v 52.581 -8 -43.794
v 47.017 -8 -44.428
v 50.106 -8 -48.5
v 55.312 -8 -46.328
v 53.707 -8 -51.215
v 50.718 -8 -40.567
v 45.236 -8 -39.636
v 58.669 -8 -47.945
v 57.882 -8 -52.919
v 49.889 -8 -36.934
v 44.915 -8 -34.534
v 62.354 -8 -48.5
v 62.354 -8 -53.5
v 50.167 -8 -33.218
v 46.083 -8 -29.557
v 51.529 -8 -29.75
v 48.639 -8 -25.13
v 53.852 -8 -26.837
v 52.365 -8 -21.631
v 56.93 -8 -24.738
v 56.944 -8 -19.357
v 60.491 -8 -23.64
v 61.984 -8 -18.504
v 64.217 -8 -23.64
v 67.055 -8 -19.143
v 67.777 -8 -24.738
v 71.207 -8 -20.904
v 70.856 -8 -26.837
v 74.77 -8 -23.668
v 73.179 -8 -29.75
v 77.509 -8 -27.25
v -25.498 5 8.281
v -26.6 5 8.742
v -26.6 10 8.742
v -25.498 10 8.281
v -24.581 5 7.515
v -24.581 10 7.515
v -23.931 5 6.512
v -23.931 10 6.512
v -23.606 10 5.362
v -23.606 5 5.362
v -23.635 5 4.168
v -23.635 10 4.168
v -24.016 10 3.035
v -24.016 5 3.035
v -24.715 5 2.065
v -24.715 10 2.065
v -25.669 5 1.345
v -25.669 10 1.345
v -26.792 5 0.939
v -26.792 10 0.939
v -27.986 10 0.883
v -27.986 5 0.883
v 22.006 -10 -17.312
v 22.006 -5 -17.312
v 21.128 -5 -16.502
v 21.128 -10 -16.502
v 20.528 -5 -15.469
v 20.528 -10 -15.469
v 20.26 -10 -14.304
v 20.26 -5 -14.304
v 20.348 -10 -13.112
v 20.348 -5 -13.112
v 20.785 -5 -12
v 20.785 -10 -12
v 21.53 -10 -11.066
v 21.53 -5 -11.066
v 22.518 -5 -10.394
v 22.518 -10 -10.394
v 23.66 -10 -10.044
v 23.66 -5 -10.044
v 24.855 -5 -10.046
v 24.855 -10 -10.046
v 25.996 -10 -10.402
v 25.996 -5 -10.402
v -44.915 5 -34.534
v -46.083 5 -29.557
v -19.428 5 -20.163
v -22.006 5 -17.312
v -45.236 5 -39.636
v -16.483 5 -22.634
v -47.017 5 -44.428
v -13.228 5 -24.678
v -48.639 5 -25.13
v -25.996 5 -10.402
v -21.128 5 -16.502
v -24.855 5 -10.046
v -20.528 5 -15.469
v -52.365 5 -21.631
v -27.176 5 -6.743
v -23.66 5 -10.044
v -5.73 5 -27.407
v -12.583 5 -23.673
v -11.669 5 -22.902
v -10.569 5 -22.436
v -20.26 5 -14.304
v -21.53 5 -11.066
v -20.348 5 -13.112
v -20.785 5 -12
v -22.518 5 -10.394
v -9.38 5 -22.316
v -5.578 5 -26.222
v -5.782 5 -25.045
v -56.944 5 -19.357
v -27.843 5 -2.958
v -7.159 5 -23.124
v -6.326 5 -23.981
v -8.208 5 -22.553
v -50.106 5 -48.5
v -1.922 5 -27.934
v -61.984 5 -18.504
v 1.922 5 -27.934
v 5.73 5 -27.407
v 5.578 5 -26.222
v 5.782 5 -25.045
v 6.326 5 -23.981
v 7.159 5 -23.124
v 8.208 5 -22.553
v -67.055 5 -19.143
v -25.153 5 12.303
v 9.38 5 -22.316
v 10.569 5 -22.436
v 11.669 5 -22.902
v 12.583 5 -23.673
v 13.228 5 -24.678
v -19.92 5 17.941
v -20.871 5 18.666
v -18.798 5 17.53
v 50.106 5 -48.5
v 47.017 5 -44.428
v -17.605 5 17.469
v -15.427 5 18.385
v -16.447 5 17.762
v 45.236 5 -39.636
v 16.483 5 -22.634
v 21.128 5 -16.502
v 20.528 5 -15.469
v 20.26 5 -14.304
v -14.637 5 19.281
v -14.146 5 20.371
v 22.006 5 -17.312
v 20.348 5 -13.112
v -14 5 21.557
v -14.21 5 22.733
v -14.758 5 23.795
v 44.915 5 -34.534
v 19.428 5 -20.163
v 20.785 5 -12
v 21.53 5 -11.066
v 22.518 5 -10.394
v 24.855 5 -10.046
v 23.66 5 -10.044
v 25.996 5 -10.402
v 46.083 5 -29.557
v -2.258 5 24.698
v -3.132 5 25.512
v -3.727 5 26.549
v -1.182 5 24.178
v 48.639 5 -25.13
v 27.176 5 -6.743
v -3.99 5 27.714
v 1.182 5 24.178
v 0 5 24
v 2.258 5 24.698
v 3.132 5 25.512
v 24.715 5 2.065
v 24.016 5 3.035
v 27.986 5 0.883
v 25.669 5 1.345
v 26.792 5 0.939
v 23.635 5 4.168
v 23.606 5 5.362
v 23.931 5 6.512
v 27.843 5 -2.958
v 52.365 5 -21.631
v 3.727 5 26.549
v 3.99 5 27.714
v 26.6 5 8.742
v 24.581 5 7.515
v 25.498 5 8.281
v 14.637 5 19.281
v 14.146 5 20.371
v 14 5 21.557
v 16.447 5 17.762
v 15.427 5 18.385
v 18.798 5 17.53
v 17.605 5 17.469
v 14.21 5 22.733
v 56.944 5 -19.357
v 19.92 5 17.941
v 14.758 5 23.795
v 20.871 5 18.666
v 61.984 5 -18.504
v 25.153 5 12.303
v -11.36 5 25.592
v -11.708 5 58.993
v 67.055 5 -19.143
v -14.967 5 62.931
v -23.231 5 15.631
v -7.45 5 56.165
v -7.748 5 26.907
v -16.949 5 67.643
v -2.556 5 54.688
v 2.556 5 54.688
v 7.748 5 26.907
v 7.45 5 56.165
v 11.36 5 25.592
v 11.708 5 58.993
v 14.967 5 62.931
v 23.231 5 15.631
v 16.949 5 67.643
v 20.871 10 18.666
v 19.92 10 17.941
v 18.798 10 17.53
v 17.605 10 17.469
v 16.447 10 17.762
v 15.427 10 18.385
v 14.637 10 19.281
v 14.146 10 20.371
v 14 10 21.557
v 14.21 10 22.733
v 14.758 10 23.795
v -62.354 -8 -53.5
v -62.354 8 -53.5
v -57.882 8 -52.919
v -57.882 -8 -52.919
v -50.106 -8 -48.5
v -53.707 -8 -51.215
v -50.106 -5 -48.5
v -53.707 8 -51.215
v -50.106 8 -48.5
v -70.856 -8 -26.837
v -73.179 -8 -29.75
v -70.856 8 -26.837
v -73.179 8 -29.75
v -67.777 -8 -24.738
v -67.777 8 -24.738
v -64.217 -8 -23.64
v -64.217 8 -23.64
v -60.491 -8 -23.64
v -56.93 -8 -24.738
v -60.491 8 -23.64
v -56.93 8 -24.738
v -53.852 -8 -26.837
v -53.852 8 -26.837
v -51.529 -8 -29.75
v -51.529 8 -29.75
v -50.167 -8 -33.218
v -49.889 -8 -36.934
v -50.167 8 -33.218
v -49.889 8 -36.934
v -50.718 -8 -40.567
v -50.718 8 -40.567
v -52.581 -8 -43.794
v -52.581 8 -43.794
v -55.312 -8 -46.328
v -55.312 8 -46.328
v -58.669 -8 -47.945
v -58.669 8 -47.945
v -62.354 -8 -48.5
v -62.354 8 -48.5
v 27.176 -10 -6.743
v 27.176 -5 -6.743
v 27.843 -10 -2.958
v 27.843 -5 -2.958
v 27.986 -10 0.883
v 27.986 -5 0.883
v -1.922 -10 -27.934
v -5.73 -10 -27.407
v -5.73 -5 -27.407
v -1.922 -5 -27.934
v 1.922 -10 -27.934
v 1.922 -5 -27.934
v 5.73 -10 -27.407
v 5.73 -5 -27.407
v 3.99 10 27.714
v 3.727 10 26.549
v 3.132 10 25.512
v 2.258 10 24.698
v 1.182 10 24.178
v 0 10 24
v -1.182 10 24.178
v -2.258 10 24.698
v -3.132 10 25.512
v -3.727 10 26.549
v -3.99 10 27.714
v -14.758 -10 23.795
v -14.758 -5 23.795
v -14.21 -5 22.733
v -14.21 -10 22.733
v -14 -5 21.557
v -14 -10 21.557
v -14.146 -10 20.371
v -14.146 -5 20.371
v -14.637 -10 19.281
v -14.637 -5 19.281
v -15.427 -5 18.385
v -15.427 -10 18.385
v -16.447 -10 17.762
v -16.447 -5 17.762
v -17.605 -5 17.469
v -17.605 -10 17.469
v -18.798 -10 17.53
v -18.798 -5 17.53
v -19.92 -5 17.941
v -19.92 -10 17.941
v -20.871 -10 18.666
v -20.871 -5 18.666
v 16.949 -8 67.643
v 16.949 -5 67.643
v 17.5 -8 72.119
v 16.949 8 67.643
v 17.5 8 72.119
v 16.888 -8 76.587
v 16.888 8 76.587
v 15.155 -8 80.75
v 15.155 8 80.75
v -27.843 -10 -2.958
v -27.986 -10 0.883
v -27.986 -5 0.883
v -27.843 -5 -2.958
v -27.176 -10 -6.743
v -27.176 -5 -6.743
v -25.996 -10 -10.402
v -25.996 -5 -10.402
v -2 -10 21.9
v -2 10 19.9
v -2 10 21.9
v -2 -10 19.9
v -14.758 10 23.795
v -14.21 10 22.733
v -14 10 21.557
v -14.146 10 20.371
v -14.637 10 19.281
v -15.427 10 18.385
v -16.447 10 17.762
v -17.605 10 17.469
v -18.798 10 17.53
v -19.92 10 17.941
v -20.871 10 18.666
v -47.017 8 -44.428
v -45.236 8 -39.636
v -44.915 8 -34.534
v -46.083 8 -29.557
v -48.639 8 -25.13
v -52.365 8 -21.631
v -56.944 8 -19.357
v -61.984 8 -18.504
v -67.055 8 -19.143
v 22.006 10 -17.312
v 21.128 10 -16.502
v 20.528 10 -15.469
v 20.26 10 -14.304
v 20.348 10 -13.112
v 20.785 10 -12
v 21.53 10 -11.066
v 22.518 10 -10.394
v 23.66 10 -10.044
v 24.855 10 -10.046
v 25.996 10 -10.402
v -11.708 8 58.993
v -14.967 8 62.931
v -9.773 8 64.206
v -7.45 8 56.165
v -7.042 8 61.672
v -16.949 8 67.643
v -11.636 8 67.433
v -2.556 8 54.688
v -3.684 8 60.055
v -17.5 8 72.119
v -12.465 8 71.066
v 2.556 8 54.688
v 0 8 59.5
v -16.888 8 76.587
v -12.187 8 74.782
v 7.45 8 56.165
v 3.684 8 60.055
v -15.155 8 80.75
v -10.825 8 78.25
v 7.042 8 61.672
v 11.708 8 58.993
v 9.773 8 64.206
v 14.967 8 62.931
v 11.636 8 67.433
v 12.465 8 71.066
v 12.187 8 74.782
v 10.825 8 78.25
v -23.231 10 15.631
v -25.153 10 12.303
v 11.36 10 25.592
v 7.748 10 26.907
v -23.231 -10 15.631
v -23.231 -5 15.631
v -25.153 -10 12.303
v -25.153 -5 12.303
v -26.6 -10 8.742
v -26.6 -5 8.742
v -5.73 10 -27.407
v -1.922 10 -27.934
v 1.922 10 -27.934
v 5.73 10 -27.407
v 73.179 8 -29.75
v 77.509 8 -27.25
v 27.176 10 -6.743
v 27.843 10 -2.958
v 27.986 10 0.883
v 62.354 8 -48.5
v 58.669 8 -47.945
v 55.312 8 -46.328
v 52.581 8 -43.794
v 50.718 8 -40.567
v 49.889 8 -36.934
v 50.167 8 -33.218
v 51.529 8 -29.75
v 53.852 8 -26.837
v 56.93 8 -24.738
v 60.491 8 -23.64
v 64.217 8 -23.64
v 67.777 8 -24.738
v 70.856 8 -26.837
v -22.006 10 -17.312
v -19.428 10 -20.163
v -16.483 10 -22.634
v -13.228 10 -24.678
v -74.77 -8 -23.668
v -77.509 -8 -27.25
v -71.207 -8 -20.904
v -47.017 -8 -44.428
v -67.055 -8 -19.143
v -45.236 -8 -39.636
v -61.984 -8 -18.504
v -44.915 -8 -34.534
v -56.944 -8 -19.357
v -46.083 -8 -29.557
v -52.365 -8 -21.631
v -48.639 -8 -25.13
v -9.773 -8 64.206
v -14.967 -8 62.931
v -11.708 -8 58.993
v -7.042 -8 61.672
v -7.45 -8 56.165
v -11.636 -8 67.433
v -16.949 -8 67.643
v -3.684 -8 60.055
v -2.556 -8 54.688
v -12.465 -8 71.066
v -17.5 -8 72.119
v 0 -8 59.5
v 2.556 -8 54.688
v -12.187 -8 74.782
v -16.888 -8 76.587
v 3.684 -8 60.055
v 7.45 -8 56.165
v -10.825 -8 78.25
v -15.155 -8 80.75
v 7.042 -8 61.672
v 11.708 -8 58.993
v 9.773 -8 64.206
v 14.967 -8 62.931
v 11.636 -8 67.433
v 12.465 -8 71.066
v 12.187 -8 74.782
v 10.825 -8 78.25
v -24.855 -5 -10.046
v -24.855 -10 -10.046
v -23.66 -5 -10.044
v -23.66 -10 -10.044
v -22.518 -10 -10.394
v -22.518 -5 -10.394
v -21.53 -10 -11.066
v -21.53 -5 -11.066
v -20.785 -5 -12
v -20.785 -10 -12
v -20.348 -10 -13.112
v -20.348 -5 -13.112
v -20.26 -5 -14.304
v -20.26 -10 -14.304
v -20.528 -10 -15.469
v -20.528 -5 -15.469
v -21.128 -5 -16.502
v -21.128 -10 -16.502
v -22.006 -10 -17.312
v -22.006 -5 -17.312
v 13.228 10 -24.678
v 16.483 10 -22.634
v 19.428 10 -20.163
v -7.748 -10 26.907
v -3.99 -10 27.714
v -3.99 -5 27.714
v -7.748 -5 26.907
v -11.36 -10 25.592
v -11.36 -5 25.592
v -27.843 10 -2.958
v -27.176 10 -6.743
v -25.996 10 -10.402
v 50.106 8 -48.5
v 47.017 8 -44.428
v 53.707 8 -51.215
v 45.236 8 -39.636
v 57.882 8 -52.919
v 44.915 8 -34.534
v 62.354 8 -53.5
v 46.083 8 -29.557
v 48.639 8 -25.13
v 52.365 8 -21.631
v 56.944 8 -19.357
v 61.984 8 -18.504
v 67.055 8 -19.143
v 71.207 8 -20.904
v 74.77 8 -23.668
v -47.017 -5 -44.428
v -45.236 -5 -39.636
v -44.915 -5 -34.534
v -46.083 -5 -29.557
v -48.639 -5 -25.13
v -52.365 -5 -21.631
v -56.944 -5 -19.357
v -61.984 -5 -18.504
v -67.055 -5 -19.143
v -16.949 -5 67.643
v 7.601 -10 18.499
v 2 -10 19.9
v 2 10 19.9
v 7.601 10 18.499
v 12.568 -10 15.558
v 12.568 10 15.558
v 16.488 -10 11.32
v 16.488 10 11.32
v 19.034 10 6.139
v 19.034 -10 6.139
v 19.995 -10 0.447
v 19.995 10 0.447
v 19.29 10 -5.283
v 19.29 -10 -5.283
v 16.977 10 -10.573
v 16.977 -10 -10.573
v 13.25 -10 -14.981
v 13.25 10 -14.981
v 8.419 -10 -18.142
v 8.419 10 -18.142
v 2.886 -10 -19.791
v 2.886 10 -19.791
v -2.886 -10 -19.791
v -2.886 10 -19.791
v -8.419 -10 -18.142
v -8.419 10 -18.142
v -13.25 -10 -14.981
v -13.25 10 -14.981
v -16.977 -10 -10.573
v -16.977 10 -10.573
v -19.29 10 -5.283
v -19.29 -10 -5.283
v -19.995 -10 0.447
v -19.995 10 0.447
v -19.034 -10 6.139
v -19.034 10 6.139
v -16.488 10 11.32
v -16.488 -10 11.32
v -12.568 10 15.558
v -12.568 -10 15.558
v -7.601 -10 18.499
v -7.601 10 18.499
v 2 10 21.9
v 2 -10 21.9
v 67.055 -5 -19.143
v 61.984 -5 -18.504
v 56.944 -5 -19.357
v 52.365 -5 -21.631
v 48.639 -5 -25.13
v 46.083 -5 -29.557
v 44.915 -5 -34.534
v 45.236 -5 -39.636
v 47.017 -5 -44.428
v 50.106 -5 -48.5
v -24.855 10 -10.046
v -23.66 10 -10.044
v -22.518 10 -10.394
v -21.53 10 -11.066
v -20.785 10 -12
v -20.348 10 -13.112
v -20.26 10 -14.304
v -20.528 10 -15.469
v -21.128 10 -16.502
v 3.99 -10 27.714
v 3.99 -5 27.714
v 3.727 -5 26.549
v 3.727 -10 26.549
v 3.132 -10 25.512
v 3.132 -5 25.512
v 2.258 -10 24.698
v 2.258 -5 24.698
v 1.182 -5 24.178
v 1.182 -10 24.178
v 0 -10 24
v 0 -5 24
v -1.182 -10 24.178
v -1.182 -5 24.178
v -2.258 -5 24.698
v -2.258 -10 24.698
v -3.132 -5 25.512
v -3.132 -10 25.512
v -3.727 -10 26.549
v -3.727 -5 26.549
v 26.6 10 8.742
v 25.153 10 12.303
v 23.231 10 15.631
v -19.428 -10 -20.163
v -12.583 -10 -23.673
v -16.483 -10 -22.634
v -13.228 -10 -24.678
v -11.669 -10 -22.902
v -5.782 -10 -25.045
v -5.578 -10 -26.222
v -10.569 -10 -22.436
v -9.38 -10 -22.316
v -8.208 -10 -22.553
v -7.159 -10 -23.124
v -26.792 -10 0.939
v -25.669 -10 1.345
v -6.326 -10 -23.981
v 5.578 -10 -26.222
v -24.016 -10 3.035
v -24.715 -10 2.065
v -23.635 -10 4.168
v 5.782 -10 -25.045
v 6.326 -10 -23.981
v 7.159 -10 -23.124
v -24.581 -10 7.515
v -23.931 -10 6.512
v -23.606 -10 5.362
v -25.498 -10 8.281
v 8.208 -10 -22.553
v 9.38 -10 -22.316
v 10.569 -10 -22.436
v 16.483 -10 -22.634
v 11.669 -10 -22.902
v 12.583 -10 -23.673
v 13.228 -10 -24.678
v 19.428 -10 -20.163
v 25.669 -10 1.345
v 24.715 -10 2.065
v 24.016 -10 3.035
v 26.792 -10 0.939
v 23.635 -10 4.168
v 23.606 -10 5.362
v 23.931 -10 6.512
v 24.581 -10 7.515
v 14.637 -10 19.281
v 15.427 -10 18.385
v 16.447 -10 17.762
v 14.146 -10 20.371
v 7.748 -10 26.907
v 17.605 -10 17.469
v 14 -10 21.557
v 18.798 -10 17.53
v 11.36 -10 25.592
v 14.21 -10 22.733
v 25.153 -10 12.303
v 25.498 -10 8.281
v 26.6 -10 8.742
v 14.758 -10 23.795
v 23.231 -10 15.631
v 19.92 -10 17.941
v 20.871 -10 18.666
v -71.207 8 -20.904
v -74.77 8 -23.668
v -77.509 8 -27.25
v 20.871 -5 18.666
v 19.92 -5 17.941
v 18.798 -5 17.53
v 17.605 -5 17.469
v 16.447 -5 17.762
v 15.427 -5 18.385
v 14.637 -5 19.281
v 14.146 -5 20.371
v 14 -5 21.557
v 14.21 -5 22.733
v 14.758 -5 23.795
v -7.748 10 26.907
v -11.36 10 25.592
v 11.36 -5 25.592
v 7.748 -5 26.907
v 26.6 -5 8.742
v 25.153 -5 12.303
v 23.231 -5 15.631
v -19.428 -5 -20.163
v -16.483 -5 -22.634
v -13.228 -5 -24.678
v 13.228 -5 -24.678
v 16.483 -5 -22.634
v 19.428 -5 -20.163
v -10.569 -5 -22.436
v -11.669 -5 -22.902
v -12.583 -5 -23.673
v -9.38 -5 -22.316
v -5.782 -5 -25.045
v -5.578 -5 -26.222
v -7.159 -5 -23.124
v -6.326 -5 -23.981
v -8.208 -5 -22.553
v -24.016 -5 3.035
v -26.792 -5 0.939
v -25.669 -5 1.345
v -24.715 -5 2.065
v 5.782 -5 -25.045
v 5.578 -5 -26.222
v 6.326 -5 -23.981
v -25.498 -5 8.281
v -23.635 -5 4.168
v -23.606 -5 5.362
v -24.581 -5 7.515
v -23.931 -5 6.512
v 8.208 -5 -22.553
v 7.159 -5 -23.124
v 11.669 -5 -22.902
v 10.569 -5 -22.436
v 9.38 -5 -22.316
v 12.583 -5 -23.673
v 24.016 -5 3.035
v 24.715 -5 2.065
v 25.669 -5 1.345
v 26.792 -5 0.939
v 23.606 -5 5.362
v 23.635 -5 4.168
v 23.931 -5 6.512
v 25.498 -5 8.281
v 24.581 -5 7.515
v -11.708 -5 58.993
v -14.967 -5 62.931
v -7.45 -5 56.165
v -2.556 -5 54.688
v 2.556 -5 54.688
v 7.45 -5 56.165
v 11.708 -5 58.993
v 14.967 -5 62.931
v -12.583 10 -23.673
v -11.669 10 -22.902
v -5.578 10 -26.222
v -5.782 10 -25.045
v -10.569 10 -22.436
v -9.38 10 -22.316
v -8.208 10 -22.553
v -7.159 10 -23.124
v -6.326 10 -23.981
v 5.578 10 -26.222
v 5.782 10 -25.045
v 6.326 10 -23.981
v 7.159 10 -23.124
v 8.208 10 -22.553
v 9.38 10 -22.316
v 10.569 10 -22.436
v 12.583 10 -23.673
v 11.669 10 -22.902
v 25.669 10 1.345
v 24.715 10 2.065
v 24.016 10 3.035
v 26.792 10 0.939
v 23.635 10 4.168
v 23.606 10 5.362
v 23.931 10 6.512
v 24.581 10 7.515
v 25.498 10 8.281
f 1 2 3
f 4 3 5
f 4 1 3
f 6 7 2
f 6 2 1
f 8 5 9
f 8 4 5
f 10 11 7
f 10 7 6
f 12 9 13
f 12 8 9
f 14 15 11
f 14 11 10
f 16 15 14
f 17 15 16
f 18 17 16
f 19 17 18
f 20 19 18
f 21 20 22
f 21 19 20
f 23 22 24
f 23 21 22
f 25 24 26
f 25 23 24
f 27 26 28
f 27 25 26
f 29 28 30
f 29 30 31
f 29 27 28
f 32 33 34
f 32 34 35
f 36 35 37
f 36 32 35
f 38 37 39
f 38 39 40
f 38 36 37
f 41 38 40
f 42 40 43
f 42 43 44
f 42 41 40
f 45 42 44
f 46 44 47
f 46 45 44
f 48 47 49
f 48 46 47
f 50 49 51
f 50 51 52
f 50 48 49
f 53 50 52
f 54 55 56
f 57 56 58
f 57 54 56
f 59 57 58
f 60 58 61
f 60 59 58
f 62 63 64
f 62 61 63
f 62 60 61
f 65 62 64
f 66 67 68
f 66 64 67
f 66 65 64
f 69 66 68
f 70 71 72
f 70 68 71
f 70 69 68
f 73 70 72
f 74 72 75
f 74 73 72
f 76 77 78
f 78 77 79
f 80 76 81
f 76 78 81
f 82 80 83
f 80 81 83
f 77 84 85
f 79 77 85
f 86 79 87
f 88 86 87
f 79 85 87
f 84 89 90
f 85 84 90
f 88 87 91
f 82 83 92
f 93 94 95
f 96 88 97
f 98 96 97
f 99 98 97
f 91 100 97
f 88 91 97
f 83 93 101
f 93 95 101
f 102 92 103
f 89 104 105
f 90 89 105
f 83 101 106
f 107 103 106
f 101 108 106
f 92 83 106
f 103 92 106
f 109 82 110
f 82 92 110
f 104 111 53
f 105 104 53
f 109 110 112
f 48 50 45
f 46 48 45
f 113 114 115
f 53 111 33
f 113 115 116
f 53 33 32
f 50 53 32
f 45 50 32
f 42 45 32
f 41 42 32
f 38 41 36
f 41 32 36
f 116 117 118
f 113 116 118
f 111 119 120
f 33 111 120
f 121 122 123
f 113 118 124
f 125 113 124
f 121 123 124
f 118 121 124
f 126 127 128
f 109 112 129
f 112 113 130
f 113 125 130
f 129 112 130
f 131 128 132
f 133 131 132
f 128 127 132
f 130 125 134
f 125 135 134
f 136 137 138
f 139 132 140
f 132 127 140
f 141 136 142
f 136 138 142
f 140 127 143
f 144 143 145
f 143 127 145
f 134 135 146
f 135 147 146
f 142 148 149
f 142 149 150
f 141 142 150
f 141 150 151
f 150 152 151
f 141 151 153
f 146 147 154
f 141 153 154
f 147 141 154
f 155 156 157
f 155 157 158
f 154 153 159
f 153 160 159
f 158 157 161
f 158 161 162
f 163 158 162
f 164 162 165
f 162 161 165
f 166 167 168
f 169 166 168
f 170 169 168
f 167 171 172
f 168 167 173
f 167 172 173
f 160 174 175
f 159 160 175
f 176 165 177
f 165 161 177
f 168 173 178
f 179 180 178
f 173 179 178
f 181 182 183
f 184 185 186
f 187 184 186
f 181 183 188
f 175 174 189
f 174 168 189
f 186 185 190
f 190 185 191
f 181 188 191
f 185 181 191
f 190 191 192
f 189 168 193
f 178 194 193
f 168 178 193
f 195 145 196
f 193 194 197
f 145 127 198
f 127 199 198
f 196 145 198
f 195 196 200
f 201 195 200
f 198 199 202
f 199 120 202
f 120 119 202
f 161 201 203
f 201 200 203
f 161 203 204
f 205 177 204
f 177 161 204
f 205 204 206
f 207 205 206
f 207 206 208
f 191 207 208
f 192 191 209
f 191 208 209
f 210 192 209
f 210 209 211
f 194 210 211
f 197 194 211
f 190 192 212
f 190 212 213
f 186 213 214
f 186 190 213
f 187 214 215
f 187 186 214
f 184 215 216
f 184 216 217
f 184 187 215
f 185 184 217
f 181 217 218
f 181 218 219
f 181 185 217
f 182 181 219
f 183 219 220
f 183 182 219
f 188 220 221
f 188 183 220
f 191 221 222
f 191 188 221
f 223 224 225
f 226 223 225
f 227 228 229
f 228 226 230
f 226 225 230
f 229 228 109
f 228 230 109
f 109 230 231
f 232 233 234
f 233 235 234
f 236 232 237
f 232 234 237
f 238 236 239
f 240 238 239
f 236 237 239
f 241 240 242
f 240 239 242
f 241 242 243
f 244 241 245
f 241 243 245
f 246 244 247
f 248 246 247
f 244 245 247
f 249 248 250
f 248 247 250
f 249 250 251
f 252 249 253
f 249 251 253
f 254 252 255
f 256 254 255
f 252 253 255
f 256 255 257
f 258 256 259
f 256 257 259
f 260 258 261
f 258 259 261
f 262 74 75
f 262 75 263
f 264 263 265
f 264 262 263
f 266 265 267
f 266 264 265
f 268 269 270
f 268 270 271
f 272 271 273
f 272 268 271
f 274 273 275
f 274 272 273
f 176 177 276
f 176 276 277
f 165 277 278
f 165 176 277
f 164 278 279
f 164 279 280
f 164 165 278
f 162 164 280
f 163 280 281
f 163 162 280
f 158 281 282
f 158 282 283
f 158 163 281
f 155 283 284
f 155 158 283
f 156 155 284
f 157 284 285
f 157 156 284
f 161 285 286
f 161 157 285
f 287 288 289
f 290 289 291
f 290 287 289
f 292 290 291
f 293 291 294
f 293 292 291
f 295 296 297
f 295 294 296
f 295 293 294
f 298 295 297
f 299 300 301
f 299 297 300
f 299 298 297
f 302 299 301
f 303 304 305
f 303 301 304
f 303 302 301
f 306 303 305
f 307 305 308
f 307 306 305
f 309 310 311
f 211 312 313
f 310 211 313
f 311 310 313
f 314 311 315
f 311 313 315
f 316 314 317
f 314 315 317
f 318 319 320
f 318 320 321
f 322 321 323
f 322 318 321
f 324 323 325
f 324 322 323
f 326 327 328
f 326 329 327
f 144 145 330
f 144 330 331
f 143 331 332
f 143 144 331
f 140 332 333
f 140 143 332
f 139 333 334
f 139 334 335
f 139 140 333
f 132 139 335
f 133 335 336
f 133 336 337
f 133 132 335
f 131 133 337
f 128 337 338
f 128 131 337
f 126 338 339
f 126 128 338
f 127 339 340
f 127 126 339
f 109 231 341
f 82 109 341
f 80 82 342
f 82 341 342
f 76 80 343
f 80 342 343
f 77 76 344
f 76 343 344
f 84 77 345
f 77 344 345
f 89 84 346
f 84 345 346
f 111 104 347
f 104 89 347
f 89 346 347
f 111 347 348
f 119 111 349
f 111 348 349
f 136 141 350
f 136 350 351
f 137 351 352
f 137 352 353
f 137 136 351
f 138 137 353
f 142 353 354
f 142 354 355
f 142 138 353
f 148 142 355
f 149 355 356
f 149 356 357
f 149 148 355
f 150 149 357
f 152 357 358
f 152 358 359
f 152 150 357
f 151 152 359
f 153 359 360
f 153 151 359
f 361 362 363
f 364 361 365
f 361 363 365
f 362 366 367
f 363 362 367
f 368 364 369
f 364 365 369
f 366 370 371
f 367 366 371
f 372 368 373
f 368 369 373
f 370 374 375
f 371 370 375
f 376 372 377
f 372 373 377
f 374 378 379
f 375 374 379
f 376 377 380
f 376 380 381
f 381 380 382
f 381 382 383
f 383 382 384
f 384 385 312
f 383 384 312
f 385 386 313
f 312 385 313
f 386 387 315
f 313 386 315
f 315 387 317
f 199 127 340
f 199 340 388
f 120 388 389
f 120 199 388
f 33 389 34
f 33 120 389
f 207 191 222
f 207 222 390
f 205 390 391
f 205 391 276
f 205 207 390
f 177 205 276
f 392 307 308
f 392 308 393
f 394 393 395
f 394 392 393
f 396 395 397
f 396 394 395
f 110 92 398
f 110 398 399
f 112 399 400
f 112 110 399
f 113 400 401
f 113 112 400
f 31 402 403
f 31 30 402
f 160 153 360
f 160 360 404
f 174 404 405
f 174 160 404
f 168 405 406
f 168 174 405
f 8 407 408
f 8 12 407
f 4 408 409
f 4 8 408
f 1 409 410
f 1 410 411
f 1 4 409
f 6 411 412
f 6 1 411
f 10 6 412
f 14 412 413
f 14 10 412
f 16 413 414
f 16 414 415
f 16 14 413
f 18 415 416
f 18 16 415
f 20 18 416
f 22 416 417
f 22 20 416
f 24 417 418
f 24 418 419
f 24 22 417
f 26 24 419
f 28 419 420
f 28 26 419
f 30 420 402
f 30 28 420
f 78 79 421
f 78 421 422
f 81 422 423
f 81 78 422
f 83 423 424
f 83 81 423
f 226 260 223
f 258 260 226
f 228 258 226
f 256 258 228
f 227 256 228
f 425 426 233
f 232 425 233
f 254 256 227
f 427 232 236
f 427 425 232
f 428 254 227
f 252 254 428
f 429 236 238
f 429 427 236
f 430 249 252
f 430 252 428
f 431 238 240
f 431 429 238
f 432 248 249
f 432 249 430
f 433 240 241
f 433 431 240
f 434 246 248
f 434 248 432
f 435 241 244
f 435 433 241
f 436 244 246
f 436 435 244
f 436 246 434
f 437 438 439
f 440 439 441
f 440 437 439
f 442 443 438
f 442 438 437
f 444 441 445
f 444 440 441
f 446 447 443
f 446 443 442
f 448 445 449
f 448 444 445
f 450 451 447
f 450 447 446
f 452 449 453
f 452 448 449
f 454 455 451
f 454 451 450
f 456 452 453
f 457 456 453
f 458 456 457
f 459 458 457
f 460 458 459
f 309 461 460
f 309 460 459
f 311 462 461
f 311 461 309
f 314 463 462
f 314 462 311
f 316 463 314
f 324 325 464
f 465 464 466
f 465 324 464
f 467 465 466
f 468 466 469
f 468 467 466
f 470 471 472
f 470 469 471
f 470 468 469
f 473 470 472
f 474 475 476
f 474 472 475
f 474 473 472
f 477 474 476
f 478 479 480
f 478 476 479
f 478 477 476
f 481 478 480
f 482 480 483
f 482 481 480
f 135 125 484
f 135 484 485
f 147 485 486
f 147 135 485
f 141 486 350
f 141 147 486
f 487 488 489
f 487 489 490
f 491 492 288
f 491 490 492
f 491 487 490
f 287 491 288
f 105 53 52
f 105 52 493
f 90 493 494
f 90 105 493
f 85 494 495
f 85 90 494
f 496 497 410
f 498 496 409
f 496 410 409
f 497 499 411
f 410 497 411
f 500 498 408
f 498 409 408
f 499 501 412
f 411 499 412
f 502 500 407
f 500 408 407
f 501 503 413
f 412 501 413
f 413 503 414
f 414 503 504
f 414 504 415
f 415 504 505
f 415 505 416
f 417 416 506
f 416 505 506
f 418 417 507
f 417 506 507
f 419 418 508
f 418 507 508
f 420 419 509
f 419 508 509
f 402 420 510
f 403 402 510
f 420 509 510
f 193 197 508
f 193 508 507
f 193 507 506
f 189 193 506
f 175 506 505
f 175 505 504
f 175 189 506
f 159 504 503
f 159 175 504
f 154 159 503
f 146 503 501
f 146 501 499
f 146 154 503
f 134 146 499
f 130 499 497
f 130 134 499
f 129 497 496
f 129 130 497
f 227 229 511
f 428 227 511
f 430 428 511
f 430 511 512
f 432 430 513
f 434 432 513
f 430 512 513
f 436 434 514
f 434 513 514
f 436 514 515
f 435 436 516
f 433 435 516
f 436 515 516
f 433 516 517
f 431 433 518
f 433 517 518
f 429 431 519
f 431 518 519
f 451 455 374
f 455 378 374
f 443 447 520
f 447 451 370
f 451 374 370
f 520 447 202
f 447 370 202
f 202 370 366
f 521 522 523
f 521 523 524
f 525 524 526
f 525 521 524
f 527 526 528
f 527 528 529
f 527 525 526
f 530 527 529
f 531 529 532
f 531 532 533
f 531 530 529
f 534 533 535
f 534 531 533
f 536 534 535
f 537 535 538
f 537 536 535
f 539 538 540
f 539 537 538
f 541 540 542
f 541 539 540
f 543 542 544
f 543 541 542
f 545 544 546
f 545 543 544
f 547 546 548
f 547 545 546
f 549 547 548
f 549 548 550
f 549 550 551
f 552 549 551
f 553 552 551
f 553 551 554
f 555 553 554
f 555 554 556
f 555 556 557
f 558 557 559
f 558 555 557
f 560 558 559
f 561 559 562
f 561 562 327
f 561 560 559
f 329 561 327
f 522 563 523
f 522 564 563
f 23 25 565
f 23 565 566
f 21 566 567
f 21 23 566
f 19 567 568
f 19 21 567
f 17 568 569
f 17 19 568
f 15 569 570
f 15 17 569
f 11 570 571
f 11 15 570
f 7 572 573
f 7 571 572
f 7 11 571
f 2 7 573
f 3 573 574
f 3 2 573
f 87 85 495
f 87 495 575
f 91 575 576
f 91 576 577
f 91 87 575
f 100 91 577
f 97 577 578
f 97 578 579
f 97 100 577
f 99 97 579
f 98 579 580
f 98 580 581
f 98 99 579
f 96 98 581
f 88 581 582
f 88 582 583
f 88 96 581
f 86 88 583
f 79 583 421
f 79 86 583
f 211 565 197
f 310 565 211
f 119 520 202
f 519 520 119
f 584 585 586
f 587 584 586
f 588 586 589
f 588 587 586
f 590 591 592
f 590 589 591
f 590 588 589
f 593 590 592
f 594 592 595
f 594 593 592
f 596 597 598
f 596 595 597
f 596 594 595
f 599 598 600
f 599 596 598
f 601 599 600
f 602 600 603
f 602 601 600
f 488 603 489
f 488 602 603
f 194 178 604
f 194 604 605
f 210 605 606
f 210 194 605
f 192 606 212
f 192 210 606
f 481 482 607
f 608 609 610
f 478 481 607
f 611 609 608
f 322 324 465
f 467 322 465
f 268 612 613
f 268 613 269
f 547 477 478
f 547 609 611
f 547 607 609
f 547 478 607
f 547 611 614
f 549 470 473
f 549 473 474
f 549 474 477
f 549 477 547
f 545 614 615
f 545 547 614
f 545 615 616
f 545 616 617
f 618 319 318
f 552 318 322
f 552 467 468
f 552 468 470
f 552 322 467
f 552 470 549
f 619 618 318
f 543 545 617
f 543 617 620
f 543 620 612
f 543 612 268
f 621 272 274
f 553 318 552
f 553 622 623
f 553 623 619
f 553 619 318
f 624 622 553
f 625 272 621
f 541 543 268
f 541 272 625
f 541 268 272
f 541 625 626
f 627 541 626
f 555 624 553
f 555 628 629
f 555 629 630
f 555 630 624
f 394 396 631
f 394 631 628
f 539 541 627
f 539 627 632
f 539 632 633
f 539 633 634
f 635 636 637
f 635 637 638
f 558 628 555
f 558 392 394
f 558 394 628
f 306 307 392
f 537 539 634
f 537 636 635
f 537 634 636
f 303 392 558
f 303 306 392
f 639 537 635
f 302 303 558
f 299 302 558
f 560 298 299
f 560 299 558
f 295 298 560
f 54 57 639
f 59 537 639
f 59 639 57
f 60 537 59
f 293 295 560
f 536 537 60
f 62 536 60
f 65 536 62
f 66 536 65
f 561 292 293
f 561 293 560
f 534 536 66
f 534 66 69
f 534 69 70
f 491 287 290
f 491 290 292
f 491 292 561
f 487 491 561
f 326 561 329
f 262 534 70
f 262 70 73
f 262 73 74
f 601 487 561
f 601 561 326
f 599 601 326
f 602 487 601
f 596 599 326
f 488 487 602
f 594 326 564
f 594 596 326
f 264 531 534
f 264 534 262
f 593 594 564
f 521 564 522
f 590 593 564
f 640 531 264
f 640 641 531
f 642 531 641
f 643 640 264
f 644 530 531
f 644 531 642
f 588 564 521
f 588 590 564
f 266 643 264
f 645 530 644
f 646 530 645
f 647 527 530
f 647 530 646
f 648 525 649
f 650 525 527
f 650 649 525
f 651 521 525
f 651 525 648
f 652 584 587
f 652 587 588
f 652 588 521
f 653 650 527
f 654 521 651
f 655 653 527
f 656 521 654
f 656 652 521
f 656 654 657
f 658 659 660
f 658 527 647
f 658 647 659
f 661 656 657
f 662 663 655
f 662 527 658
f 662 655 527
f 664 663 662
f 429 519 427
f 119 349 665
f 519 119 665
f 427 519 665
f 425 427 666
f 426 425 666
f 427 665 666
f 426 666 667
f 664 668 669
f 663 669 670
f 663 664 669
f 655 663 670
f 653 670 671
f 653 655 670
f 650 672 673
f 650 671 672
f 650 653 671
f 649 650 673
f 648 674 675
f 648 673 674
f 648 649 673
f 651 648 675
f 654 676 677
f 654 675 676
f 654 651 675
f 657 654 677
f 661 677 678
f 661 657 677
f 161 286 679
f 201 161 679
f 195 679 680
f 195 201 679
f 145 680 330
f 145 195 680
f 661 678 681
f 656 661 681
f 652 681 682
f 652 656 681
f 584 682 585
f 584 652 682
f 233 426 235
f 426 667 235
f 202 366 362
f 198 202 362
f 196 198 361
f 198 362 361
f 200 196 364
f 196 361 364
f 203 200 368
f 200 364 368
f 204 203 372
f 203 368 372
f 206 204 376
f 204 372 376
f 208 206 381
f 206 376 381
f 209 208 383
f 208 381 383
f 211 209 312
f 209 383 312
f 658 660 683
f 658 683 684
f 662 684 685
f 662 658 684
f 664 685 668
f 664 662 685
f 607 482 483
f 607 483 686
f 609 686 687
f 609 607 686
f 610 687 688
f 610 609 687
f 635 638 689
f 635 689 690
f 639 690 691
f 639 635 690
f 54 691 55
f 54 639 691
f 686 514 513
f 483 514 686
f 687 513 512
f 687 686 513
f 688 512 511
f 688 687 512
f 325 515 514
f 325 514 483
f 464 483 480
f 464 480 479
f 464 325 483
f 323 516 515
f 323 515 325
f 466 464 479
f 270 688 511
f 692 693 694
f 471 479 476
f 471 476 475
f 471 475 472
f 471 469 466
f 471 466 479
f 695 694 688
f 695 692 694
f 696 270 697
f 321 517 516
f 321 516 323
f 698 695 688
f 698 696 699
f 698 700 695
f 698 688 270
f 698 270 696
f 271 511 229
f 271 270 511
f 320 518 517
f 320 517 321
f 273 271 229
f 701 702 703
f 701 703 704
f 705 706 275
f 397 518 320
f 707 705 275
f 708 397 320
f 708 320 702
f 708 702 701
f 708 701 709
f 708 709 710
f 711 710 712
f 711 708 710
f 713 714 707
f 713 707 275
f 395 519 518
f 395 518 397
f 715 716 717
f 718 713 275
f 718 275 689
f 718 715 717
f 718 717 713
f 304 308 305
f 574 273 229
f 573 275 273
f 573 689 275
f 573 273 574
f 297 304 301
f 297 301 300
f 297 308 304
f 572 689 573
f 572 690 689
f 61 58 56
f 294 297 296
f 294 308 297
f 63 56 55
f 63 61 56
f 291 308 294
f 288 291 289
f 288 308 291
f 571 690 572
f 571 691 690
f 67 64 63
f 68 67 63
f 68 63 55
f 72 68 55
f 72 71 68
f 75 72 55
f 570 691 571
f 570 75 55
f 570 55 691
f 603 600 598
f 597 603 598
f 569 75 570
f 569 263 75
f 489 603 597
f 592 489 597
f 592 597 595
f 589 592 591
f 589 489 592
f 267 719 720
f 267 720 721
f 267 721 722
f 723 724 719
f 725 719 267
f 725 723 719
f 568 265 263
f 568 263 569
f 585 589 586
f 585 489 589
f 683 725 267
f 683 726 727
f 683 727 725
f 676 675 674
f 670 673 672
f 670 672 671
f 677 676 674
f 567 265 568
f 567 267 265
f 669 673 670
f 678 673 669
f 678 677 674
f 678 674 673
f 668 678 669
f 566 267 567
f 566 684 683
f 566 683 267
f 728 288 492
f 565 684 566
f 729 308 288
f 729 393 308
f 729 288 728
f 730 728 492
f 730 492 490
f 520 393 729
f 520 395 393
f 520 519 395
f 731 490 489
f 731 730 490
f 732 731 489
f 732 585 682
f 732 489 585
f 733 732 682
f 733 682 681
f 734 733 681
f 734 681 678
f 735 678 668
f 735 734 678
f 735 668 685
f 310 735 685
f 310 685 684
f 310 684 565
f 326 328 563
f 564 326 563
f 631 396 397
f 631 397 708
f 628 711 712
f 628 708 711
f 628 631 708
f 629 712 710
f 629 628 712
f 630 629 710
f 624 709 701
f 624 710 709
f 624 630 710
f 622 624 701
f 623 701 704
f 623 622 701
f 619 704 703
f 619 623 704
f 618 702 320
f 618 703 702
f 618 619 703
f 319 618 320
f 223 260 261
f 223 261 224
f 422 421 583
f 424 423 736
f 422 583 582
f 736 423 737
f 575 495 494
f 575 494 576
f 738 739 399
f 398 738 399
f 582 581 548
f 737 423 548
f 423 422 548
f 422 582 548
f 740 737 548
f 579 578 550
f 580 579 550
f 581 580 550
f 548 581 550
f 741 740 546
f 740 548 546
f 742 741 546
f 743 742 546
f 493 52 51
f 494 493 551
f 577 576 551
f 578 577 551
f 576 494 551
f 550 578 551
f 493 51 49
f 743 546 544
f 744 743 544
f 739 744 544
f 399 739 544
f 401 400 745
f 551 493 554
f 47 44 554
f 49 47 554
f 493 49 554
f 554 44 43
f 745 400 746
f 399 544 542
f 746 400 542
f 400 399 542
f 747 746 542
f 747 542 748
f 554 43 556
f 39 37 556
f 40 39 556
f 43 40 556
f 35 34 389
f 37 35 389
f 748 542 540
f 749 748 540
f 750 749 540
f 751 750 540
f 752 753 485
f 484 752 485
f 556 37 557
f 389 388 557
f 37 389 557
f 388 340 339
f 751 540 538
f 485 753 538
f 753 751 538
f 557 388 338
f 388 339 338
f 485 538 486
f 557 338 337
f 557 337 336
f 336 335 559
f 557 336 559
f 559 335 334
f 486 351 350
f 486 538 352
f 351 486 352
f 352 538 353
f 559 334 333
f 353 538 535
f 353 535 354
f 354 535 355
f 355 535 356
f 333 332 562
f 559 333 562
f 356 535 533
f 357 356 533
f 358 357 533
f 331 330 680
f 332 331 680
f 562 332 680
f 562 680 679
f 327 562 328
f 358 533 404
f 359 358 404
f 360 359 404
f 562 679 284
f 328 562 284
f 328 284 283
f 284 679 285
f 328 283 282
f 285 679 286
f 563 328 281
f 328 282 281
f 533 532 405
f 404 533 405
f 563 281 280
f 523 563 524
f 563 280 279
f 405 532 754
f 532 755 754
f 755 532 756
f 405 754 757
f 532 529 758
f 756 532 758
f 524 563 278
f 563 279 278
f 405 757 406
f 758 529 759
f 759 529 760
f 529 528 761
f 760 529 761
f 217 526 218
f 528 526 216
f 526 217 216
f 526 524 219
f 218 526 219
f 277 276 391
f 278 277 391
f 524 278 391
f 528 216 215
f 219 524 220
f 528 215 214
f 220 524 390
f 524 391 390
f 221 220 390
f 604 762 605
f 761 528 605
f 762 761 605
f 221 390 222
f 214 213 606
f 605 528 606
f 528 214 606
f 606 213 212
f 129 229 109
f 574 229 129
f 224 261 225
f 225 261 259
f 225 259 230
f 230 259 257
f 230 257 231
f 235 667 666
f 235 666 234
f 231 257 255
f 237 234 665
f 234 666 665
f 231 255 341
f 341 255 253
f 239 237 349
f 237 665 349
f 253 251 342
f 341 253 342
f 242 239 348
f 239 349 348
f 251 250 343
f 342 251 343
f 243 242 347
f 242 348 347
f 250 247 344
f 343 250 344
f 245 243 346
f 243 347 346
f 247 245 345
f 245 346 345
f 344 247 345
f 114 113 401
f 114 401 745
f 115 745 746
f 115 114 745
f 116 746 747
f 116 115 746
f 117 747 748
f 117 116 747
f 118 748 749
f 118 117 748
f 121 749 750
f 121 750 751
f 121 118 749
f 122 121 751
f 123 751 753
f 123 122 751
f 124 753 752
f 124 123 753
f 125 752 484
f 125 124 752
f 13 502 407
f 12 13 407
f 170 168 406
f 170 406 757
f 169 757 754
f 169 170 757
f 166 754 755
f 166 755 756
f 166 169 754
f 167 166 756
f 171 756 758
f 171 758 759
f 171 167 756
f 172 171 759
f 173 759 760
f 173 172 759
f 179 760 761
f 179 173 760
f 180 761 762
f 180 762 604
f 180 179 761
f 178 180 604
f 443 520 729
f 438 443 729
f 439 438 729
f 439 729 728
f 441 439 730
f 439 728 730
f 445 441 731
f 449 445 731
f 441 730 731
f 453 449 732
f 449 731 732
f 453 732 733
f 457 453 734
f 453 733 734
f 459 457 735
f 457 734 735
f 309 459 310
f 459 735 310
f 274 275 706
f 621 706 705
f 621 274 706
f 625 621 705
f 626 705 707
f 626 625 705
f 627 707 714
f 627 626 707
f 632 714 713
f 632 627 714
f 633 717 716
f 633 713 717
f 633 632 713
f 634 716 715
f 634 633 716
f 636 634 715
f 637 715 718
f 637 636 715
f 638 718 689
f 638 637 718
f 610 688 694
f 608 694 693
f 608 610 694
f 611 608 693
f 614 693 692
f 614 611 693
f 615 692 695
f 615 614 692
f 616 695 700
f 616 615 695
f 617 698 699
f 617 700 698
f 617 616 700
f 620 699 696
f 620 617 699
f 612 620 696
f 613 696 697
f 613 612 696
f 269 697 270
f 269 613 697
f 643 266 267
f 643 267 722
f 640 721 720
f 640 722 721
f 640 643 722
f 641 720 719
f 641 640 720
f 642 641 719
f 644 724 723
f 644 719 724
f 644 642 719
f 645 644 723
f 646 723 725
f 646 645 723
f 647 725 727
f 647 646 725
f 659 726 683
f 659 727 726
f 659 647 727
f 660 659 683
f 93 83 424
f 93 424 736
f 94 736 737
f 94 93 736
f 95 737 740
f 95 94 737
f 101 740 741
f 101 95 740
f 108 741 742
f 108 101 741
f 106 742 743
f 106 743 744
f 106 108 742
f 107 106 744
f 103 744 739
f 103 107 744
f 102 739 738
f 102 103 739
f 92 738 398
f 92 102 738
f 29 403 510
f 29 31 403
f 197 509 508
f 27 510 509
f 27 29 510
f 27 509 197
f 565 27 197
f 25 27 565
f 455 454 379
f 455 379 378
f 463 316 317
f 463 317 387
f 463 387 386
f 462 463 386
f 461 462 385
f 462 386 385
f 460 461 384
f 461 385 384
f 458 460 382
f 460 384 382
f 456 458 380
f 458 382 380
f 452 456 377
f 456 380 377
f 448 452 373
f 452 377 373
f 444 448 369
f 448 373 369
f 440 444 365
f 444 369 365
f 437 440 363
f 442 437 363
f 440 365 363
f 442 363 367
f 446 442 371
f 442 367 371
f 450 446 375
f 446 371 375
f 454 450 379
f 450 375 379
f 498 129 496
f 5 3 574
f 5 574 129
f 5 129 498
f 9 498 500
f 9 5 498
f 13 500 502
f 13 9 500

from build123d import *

# Parameters (mm, degrees)
F1_DEPTH = 10
F2_DEPTH = 8
F3_DEPTH = 5


with BuildPart() as f1:
    # F0 (on Front) → F1 (new body, symmetric)
    with BuildSketch(Plane.XZ):
        with BuildLine():
            ThreePointArc((3.989783, 27.714286), (0, 24), (-3.989783, 27.714286))
            ThreePointArc((-3.989783, 27.714286), (-9.576564, 26.311393), (-14.758048, 23.794958))
            ThreePointArc((-14.758048, 23.794958), (-15.426903, 18.385067), (-20.87075, 18.665792))
            ThreePointArc((-20.87075, 18.665792), (-24.248711, 14), (-26.600425, 8.741704))
            ThreePointArc((-26.600425, 8.741704), (-23.635386, 4.167556), (-27.986062, 0.883366))
            ThreePointArc((-27.986062, 0.883366), (-27.574617, -4.862149), (-25.996167, -10.40189))
            ThreePointArc((-25.996167, -10.40189), (-20.78461, -12), (-22.006384, -17.312396))
            ThreePointArc((-22.006384, -17.312396), (-17.998053, -21.449244), (-13.228013, -24.678324))
            ThreePointArc((-13.228013, -24.678324), (-8.208483, -22.552623), (-5.729674, -27.407496))
            ThreePointArc((-5.729674, -27.407496), (0, -28), (5.729674, -27.407496))
            ThreePointArc((5.729674, -27.407496), (8.208483, -22.552623), (13.228013, -24.678324))
            ThreePointArc((13.228013, -24.678324), (17.998053, -21.449244), (22.006384, -17.312396))
            ThreePointArc((22.006384, -17.312396), (20.78461, -12), (25.996167, -10.40189))
            ThreePointArc((25.996167, -10.40189), (27.574617, -4.862149), (27.986062, 0.883366))
            ThreePointArc((27.986062, 0.883366), (23.635386, 4.167556), (26.600425, 8.741704))
            ThreePointArc((26.600425, 8.741704), (24.248711, 14), (20.87075, 18.665792))
            ThreePointArc((20.87075, 18.665792), (15.426903, 18.385067), (14.758048, 23.794958))
            ThreePointArc((14.758048, 23.794958), (9.576564, 26.311393), (3.989783, 27.714286))
        make_face()
        with BuildLine():
            ThreePointArc((2, 19.899749), (0, -20), (-2, 19.899749))
            Line((-2, 19.899749), (-2, 21.899749))
            Line((-2, 21.899749), (2, 21.899749))
            Line((2, 21.899749), (2, 19.899749))
        make_face(mode=Mode.SUBTRACT)
    extrude(amount=F1_DEPTH, both=True)



with BuildPart() as f2:
    # F0 (on Front) → F2 (new body, symmetric)
    with BuildSketch(Plane.XZ):
        with BuildLine():
            Line((-10.825318, 78.25), (-15.155445, 80.75))
            ThreePointArc((-15.155445, 80.75), (-17.338404, 74.372706), (-16.949042, 67.643398))
            ThreePointArc((-16.949042, 67.643398), (0, 54.5), (16.949042, 67.643398))
            ThreePointArc((16.949042, 67.643398), (17.338404, 74.372706), (15.155445, 80.75))
            Line((15.155445, 80.75), (10.825318, 78.25))
            ThreePointArc((10.825318, 78.25), (0, 59.5), (-10.825318, 78.25))
        make_face()
        with BuildLine():
            ThreePointArc((-50.10638, -48.5), (-47.198385, -27.25), (-67.055422, -19.143398))
            ThreePointArc((-67.055422, -19.143398), (-73.077855, -22.170855), (-77.509274, -27.25))
            Line((-77.509274, -27.25), (-73.179147, -29.75))
            ThreePointArc((-73.179147, -29.75), (-51.528512, -29.75), (-62.353829, -48.5))
            Line((-62.353829, -48.5), (-62.353829, -53.5))
            ThreePointArc((-62.353829, -53.5), (-55.739451, -52.201852), (-50.10638, -48.5))
        make_face()
        with BuildLine():
            ThreePointArc((77.509274, -27.25), (73.077855, -22.170855), (67.055422, -19.143398))
            ThreePointArc((67.055422, -19.143398), (47.198385, -27.25), (50.10638, -48.5))
            ThreePointArc((50.10638, -48.5), (55.739451, -52.201852), (62.353829, -53.5))
            Line((62.353829, -53.5), (62.353829, -48.5))
            ThreePointArc((62.353829, -48.5), (51.528512, -29.75), (73.179147, -29.75))
            Line((73.179147, -29.75), (77.509274, -27.25))
        make_face()
    extrude(amount=F2_DEPTH, both=True)


with BuildPart() as f1_1:
    add(f1.part)

    add(f2.part)  # F3 merges F2
    # F0 (on Front) → F3 (join, symmetric)
    with BuildSketch(Plane.XZ):
        with BuildLine():
            ThreePointArc((16.949042, 67.643398), (0, 54.5), (-16.949042, 67.643398))
            Line((-16.949042, 67.643398), (-67.055422, -19.143398))
            ThreePointArc((-67.055422, -19.143398), (-47.198385, -27.25), (-50.10638, -48.5))
            Line((-50.10638, -48.5), (50.10638, -48.5))
            ThreePointArc((50.10638, -48.5), (47.198385, -27.25), (67.055422, -19.143398))
            Line((67.055422, -19.143398), (16.949042, 67.643398))
        make_face()
        with BuildLine():
            ThreePointArc((-14.758048, 23.794958), (-9.576564, 26.311393), (-3.989783, 27.714286))
            ThreePointArc((-3.989783, 27.714286), (0, 24), (3.989783, 27.714286))
            ThreePointArc((3.989783, 27.714286), (9.576564, 26.311393), (14.758048, 23.794958))
            ThreePointArc((14.758048, 23.794958), (15.426903, 18.385067), (20.87075, 18.665792))
            ThreePointArc((20.87075, 18.665792), (24.248711, 14), (26.600425, 8.741704))
            ThreePointArc((26.600425, 8.741704), (23.635386, 4.167556), (27.986062, 0.883366))
            ThreePointArc((27.986062, 0.883366), (27.574617, -4.862149), (25.996167, -10.40189))
            ThreePointArc((25.996167, -10.40189), (20.78461, -12), (22.006384, -17.312396))
            ThreePointArc((22.006384, -17.312396), (17.998053, -21.449244), (13.228013, -24.678324))
            ThreePointArc((13.228013, -24.678324), (8.208483, -22.552623), (5.729674, -27.407496))
            ThreePointArc((5.729674, -27.407496), (0, -28), (-5.729674, -27.407496))
            ThreePointArc((-5.729674, -27.407496), (-8.208483, -22.552623), (-13.228013, -24.678324))
            ThreePointArc((-13.228013, -24.678324), (-17.998053, -21.449244), (-22.006384, -17.312396))
            ThreePointArc((-22.006384, -17.312396), (-20.78461, -12), (-25.996167, -10.40189))
            ThreePointArc((-25.996167, -10.40189), (-27.574617, -4.862149), (-27.986062, 0.883366))
            ThreePointArc((-27.986062, 0.883366), (-23.635386, 4.167556), (-26.600425, 8.741704))
            ThreePointArc((-26.600425, 8.741704), (-24.248711, 14), (-20.87075, 18.665792))
            ThreePointArc((-20.87075, 18.665792), (-15.426903, 18.385067), (-14.758048, 23.794958))
        make_face(mode=Mode.SUBTRACT)
    extrude(amount=F3_DEPTH, both=True)


solid = f1_1.part
